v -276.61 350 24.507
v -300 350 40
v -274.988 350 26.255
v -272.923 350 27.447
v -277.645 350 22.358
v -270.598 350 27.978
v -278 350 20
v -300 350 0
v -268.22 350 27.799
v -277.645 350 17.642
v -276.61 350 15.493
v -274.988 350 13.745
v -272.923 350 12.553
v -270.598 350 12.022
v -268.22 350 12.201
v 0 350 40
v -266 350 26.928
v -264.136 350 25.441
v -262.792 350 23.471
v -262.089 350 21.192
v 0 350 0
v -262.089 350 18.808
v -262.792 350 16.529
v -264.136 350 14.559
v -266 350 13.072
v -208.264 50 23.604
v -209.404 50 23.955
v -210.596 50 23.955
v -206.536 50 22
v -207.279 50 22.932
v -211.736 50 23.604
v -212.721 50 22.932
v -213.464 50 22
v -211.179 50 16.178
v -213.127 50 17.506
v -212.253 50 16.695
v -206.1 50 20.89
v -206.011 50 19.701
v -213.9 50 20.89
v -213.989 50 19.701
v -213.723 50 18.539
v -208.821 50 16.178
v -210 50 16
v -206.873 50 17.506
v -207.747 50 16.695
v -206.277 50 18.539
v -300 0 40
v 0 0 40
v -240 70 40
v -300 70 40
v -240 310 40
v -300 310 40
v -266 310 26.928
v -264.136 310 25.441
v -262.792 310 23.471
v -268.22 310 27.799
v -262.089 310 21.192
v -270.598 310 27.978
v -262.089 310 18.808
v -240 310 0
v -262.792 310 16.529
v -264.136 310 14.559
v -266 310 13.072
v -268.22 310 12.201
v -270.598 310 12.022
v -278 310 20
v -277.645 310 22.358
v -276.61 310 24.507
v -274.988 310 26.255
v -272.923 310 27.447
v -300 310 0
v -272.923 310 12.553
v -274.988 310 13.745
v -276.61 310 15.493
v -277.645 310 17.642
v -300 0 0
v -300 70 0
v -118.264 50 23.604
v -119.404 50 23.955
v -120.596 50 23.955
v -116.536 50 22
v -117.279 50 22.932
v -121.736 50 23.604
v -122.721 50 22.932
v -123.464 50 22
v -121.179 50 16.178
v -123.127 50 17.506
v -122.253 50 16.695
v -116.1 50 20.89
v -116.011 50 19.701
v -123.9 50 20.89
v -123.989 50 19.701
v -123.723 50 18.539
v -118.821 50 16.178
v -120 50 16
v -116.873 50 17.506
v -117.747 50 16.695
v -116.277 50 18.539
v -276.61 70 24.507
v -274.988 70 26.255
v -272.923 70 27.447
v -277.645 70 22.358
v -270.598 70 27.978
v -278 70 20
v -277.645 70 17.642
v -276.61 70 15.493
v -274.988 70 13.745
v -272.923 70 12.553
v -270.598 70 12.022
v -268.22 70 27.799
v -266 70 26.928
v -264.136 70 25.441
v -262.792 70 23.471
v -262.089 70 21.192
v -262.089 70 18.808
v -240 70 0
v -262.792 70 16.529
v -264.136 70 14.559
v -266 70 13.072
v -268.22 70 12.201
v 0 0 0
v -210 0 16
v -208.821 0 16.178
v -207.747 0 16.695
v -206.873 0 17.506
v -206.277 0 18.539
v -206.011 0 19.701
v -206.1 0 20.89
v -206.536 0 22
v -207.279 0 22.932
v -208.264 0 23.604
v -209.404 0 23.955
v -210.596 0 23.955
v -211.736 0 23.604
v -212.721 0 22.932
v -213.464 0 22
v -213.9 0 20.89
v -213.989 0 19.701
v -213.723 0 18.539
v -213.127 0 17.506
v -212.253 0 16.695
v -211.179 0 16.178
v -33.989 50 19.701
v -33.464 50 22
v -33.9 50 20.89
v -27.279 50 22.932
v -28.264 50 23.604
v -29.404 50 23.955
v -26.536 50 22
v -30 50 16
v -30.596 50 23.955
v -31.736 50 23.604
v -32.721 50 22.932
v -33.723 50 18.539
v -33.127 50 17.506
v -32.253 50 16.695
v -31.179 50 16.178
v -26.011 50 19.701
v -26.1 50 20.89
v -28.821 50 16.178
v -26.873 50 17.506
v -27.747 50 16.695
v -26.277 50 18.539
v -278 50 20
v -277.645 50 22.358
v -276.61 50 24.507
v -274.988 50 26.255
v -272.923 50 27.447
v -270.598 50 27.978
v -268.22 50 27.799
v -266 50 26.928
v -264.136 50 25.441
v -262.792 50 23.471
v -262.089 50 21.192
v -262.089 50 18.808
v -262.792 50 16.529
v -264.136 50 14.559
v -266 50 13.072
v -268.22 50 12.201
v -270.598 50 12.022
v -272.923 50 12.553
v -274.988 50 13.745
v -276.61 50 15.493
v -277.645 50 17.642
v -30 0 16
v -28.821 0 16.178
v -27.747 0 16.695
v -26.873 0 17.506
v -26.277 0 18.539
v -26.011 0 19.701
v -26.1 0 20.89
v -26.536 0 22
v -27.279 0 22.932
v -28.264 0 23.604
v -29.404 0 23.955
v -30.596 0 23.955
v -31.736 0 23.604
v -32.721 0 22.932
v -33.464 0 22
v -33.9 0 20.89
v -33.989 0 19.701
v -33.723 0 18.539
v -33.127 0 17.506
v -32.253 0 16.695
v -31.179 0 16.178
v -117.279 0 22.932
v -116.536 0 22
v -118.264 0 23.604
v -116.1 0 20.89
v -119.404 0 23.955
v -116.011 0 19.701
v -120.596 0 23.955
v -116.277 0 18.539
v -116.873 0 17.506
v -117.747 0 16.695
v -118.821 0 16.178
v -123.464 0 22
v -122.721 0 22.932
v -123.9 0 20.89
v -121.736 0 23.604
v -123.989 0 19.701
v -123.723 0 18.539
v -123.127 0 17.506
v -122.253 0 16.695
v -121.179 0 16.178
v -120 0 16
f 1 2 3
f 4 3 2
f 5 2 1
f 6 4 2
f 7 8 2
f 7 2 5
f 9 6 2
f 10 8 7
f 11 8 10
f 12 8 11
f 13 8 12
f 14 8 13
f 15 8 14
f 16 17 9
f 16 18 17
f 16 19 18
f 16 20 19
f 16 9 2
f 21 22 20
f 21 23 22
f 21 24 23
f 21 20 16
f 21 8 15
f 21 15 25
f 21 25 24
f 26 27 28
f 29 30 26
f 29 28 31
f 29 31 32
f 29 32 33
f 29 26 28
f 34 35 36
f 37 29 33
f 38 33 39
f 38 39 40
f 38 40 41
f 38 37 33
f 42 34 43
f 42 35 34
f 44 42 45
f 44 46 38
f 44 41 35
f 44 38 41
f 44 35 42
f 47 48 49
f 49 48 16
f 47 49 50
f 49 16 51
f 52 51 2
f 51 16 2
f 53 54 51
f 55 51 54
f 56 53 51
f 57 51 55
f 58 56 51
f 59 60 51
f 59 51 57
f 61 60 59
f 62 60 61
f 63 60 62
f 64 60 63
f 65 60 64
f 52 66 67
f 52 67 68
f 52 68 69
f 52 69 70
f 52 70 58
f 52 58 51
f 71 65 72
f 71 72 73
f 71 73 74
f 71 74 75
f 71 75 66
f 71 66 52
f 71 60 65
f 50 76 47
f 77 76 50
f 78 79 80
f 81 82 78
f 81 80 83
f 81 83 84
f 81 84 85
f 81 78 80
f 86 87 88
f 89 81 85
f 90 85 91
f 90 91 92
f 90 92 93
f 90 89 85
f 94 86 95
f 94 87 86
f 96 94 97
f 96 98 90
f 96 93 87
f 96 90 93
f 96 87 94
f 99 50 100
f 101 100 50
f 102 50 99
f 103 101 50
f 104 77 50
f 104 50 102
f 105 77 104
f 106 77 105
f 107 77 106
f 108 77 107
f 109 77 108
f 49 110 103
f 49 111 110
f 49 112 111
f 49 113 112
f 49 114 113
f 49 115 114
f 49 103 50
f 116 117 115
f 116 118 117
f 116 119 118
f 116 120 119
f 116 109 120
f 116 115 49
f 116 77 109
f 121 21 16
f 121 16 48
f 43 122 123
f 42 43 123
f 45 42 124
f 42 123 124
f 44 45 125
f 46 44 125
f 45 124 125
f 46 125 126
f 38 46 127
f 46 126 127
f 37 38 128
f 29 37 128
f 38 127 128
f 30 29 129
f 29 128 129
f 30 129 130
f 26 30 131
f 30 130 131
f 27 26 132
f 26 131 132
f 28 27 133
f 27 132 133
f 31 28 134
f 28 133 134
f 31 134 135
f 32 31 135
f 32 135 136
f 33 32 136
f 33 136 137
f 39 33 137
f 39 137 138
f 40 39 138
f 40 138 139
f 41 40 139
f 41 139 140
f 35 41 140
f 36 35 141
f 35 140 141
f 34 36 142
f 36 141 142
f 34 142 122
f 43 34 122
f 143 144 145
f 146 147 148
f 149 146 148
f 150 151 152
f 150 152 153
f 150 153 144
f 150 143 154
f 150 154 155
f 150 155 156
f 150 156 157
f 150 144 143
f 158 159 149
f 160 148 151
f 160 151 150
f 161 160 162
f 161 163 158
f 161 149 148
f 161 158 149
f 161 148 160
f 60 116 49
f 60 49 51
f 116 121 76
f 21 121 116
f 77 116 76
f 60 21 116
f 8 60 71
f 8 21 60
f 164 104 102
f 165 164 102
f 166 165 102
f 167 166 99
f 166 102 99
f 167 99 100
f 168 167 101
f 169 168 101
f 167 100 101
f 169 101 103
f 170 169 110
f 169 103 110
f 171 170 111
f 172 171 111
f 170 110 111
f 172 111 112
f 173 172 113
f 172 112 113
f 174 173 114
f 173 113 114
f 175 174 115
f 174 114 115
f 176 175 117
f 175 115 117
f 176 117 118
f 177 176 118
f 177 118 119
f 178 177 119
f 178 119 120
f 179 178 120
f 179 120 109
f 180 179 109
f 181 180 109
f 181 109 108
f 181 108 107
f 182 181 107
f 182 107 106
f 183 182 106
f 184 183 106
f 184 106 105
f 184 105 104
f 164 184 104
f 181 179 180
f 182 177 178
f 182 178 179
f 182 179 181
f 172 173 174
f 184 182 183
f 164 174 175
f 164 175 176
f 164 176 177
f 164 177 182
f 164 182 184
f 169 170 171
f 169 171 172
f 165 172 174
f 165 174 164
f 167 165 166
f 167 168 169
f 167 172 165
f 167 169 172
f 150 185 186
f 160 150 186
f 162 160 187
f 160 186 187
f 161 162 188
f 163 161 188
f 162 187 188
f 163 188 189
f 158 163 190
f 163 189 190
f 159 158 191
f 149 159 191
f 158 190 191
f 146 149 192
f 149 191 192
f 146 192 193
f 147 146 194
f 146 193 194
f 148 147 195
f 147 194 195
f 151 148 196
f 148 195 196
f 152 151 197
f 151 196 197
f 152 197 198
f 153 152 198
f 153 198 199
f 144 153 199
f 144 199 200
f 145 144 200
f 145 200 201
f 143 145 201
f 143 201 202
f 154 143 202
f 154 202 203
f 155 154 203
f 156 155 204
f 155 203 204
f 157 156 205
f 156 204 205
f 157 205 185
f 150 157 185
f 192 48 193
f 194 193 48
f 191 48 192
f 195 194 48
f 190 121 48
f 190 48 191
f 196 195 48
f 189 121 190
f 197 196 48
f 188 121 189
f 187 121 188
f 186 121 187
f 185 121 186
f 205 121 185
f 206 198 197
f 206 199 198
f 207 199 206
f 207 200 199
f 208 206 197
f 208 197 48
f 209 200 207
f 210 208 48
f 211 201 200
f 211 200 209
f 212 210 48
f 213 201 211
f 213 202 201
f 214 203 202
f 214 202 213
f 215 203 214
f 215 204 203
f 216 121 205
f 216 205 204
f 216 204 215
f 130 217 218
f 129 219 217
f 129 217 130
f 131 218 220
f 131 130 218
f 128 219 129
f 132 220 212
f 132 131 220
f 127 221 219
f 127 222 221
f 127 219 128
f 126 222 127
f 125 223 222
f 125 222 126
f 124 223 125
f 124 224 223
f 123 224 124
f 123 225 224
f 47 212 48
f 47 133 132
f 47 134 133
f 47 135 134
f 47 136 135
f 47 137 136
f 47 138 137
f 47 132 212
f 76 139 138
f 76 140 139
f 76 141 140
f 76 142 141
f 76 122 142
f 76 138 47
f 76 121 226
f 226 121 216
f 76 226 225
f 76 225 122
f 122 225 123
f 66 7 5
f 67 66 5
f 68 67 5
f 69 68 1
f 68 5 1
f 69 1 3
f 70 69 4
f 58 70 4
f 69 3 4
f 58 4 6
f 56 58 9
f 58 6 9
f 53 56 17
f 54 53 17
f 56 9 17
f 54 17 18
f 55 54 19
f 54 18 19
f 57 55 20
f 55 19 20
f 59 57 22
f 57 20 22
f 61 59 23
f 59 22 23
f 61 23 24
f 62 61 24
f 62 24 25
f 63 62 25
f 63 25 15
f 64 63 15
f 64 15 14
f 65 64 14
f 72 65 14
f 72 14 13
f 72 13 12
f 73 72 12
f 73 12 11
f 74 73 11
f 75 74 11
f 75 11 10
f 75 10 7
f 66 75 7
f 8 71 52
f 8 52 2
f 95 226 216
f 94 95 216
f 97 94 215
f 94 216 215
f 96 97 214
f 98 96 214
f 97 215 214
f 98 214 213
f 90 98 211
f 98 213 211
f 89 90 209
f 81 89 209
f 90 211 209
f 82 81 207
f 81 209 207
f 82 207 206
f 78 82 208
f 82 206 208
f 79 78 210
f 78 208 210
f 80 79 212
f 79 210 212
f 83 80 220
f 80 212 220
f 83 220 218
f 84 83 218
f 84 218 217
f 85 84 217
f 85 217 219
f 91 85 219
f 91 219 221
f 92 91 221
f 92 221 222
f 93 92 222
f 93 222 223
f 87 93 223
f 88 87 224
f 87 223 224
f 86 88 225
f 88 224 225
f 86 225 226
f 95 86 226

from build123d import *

# Parameters (mm, degrees)
EXTRUDE_1_DEPTH     = 40
SKETCH_2_R          = 8
CUT_EXTRUDE_1_DEPTH = 300
SKETCH_3_R          = 4
CUT_EXTRUDE_2_DEPTH = 50


with BuildPart() as part:
    # Эскиз1 → Бобышка-Вытянуть1 (new body)
    with BuildSketch(Plane.XY):
        Polygon((-300, 310), (-300, 350), (0, 350), (0, 0), (-300, 0), (-300, 70), (-240, 70), (-240, 310), align=None)
    extrude(amount=EXTRUDE_1_DEPTH)

    # Эскиз2 → Вырез-Вытянуть1 (cut)
    with BuildSketch(Plane(origin=(0, 350, 0), x_dir=(1, 0, 0), z_dir=(0, 1, 0))):
        with Locations(Location((-270, -20, 0), (0, 0, 180))):
            Circle(SKETCH_2_R)
    extrude(amount=-CUT_EXTRUDE_1_DEPTH, mode=Mode.SUBTRACT)

    # Эскиз3 → Вырез-Вытянуть2 (cut)
    with BuildSketch(Plane.XZ):
        with Locations(Location((-30, 20, 0), (0, 0, 270))):
            Circle(SKETCH_3_R)
        with Locations(Location((-120, 20, 0), (0, 0, 270))):
            Circle(SKETCH_3_R)
        with Locations(Location((-210, 20, 0), (0, 0, 270))):
            Circle(SKETCH_3_R)
    extrude(amount=-CUT_EXTRUDE_2_DEPTH, mode=Mode.SUBTRACT)


solid = part.part
